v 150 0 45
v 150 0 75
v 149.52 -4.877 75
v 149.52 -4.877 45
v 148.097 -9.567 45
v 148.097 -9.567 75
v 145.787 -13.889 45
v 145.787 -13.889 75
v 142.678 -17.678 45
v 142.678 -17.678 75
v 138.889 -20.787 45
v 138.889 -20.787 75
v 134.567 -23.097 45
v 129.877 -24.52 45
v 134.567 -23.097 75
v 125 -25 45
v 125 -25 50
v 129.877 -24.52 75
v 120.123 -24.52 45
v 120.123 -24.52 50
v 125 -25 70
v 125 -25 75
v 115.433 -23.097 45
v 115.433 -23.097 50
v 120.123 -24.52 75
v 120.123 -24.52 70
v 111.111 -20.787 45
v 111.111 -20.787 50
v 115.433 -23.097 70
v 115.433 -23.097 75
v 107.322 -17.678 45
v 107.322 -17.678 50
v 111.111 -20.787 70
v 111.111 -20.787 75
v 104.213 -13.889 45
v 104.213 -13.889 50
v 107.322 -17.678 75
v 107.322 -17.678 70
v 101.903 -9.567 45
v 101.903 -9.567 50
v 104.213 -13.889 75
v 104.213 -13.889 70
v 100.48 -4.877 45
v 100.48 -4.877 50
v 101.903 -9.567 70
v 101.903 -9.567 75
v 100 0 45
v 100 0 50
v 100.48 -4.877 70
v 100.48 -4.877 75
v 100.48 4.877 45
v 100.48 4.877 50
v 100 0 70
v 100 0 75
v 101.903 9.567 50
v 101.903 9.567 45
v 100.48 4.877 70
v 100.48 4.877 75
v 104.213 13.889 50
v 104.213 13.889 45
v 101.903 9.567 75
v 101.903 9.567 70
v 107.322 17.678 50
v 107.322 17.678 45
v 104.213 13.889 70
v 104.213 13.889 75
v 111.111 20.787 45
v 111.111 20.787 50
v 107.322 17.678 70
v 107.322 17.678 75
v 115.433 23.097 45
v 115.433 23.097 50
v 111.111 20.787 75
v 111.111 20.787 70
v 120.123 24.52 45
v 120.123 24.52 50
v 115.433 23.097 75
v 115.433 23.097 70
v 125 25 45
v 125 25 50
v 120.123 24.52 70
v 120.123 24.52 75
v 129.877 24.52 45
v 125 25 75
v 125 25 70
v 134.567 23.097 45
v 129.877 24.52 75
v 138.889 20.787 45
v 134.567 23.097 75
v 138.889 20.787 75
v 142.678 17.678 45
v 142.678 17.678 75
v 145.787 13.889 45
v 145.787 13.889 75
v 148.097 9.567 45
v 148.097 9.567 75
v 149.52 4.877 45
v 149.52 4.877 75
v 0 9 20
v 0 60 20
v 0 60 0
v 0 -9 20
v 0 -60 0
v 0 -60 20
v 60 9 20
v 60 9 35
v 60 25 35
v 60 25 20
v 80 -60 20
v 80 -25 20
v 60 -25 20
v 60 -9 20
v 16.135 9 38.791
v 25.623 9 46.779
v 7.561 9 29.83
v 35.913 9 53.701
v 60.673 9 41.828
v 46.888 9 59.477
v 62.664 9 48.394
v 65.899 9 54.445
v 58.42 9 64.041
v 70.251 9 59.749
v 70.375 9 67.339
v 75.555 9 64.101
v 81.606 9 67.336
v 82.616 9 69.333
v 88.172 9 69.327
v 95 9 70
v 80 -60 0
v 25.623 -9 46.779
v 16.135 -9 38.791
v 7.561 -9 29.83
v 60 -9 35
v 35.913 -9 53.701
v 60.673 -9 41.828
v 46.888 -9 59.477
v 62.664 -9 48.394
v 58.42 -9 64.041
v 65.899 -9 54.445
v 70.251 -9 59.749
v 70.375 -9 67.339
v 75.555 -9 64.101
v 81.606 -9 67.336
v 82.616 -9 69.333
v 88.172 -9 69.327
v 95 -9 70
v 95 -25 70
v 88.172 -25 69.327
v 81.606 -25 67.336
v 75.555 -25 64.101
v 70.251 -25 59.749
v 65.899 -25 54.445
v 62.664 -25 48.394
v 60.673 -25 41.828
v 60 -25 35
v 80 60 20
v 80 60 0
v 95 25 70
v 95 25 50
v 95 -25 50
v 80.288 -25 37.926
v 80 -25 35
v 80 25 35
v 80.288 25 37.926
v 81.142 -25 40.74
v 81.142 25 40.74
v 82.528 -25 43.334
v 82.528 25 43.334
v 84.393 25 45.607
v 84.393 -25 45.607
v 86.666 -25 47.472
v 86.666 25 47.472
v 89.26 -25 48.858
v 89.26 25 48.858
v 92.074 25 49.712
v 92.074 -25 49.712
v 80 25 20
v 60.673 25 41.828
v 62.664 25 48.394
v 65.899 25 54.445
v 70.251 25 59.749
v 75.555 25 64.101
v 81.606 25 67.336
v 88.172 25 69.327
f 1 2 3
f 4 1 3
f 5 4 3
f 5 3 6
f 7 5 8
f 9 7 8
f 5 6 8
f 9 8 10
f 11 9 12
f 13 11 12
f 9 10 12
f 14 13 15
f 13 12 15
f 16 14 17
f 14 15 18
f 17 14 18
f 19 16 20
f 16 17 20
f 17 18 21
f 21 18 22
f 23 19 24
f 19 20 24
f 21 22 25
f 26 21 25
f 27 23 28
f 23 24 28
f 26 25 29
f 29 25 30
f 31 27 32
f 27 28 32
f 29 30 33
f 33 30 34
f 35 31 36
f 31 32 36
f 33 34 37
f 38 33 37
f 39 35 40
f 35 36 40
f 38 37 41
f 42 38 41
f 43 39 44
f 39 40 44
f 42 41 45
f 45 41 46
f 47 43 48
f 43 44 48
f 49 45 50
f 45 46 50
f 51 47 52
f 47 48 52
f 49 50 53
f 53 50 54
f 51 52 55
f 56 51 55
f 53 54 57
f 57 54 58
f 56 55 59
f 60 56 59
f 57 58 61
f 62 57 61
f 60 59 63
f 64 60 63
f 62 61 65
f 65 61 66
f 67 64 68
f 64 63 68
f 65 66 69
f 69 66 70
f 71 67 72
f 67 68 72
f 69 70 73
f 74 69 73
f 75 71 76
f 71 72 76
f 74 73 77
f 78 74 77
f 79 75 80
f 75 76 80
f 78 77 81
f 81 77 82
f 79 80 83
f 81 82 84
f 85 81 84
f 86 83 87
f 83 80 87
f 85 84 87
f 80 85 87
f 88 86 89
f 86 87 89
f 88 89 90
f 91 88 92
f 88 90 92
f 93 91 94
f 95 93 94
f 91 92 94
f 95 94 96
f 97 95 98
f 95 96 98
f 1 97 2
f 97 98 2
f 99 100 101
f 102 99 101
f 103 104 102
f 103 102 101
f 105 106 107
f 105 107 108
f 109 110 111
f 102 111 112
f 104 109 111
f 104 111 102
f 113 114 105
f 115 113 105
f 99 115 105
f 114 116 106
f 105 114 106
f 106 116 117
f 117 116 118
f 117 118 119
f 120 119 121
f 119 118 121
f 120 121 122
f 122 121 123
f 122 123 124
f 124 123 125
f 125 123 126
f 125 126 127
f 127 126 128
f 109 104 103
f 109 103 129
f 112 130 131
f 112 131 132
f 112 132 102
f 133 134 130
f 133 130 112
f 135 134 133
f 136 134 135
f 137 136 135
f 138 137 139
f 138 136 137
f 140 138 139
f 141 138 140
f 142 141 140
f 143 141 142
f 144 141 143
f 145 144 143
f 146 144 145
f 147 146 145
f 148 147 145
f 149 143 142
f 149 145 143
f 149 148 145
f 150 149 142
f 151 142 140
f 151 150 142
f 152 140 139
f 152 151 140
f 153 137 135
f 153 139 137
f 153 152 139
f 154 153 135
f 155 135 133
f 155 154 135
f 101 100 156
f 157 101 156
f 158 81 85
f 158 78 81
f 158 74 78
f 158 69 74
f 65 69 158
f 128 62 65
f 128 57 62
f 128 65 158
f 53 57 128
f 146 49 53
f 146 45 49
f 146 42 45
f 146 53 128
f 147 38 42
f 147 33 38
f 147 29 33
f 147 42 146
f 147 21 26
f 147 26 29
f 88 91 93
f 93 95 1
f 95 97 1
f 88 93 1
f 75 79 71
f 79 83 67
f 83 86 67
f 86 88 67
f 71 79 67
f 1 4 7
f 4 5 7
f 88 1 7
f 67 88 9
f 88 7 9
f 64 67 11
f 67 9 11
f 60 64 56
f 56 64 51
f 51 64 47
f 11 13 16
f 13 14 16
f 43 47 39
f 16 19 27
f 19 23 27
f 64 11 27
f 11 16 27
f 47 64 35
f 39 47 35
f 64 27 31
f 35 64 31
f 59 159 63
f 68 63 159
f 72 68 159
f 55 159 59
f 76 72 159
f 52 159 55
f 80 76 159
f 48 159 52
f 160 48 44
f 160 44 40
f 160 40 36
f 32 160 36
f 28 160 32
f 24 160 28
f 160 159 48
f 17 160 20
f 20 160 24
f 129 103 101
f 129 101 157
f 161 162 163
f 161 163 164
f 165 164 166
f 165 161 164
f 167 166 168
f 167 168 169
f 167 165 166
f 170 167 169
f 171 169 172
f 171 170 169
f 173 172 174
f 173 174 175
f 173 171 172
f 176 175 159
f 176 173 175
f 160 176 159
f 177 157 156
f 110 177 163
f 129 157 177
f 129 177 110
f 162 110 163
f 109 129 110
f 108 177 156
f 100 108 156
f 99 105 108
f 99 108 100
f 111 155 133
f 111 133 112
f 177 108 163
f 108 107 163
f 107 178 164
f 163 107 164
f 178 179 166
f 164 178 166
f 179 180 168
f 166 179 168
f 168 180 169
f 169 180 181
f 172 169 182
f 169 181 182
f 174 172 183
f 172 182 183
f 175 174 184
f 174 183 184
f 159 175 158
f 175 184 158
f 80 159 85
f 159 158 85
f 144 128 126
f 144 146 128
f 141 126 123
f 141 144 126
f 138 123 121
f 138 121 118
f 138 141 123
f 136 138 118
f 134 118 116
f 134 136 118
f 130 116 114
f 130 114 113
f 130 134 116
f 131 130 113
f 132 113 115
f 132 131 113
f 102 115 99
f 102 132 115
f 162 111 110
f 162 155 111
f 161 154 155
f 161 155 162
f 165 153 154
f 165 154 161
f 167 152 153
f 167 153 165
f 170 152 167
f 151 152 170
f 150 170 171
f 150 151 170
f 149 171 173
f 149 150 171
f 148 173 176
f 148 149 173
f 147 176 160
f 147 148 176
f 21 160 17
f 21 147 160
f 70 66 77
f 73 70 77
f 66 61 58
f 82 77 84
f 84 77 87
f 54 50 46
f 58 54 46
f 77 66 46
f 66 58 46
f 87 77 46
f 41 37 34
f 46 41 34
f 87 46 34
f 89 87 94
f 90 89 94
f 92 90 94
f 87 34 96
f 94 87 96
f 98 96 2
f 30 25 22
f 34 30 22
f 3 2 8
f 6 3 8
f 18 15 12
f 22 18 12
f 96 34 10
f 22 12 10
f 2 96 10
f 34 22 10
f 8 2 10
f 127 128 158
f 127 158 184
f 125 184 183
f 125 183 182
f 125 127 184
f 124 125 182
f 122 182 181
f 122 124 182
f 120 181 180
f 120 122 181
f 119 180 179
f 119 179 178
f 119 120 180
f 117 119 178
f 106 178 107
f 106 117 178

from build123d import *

# Parameters (mm, degrees)
F1_DEPTH = 60
F2_DEPTH = 25
F3_DEPTH = 9


with BuildPart() as f1:
    # F0 (on Front) → F1 (new body, symmetric)
    with BuildSketch(Plane.XZ):
        Polygon((0, 20), (0, 0), (80, 0), (80, 20), (60, 20), align=None)
    extrude(amount=F1_DEPTH, both=True)

    # F0 (on Front) → F2 (join, symmetric)
    with BuildSketch(Plane.XZ):
        with BuildLine():
            Line((60, 20), (80, 20))
            Line((80, 20), (80, 35))
            ThreePointArc((80, 35), (84.393398, 45.606602), (95, 50))
            Line((95, 50), (100, 50))
            Line((100, 50), (125, 50))
            Line((125, 50), (125, 70))
            Line((125, 70), (100, 70))
            Line((100, 70), (95, 70))
            ThreePointArc((95, 70), (70.251263, 59.748737), (60, 35))
            Line((60, 35), (60, 20))
        make_face()
    extrude(amount=F2_DEPTH, both=True)

    # F0 (on Front) → F3 (join, symmetric)
    with BuildSketch(Plane.XZ):
        with BuildLine():
            ThreePointArc((95, 70), (41.322724, 56.736825), (0, 20))
            Line((0, 20), (60, 20))
            Line((60, 20), (60, 35))
            ThreePointArc((60, 35), (70.251263, 59.748737), (95, 70))
        make_face()
    extrude(amount=F3_DEPTH, both=True)

    # F0 (on Front) → F4 (revolve)
    with BuildSketch(Plane.XZ):
        Polygon((125, 75), (125, 70), (125, 50), (125, 45), (150, 45), (150, 75), align=None)
    revolve(axis=Axis((125, 0, 60), (0, 0, -1)))


solid = f1.part
